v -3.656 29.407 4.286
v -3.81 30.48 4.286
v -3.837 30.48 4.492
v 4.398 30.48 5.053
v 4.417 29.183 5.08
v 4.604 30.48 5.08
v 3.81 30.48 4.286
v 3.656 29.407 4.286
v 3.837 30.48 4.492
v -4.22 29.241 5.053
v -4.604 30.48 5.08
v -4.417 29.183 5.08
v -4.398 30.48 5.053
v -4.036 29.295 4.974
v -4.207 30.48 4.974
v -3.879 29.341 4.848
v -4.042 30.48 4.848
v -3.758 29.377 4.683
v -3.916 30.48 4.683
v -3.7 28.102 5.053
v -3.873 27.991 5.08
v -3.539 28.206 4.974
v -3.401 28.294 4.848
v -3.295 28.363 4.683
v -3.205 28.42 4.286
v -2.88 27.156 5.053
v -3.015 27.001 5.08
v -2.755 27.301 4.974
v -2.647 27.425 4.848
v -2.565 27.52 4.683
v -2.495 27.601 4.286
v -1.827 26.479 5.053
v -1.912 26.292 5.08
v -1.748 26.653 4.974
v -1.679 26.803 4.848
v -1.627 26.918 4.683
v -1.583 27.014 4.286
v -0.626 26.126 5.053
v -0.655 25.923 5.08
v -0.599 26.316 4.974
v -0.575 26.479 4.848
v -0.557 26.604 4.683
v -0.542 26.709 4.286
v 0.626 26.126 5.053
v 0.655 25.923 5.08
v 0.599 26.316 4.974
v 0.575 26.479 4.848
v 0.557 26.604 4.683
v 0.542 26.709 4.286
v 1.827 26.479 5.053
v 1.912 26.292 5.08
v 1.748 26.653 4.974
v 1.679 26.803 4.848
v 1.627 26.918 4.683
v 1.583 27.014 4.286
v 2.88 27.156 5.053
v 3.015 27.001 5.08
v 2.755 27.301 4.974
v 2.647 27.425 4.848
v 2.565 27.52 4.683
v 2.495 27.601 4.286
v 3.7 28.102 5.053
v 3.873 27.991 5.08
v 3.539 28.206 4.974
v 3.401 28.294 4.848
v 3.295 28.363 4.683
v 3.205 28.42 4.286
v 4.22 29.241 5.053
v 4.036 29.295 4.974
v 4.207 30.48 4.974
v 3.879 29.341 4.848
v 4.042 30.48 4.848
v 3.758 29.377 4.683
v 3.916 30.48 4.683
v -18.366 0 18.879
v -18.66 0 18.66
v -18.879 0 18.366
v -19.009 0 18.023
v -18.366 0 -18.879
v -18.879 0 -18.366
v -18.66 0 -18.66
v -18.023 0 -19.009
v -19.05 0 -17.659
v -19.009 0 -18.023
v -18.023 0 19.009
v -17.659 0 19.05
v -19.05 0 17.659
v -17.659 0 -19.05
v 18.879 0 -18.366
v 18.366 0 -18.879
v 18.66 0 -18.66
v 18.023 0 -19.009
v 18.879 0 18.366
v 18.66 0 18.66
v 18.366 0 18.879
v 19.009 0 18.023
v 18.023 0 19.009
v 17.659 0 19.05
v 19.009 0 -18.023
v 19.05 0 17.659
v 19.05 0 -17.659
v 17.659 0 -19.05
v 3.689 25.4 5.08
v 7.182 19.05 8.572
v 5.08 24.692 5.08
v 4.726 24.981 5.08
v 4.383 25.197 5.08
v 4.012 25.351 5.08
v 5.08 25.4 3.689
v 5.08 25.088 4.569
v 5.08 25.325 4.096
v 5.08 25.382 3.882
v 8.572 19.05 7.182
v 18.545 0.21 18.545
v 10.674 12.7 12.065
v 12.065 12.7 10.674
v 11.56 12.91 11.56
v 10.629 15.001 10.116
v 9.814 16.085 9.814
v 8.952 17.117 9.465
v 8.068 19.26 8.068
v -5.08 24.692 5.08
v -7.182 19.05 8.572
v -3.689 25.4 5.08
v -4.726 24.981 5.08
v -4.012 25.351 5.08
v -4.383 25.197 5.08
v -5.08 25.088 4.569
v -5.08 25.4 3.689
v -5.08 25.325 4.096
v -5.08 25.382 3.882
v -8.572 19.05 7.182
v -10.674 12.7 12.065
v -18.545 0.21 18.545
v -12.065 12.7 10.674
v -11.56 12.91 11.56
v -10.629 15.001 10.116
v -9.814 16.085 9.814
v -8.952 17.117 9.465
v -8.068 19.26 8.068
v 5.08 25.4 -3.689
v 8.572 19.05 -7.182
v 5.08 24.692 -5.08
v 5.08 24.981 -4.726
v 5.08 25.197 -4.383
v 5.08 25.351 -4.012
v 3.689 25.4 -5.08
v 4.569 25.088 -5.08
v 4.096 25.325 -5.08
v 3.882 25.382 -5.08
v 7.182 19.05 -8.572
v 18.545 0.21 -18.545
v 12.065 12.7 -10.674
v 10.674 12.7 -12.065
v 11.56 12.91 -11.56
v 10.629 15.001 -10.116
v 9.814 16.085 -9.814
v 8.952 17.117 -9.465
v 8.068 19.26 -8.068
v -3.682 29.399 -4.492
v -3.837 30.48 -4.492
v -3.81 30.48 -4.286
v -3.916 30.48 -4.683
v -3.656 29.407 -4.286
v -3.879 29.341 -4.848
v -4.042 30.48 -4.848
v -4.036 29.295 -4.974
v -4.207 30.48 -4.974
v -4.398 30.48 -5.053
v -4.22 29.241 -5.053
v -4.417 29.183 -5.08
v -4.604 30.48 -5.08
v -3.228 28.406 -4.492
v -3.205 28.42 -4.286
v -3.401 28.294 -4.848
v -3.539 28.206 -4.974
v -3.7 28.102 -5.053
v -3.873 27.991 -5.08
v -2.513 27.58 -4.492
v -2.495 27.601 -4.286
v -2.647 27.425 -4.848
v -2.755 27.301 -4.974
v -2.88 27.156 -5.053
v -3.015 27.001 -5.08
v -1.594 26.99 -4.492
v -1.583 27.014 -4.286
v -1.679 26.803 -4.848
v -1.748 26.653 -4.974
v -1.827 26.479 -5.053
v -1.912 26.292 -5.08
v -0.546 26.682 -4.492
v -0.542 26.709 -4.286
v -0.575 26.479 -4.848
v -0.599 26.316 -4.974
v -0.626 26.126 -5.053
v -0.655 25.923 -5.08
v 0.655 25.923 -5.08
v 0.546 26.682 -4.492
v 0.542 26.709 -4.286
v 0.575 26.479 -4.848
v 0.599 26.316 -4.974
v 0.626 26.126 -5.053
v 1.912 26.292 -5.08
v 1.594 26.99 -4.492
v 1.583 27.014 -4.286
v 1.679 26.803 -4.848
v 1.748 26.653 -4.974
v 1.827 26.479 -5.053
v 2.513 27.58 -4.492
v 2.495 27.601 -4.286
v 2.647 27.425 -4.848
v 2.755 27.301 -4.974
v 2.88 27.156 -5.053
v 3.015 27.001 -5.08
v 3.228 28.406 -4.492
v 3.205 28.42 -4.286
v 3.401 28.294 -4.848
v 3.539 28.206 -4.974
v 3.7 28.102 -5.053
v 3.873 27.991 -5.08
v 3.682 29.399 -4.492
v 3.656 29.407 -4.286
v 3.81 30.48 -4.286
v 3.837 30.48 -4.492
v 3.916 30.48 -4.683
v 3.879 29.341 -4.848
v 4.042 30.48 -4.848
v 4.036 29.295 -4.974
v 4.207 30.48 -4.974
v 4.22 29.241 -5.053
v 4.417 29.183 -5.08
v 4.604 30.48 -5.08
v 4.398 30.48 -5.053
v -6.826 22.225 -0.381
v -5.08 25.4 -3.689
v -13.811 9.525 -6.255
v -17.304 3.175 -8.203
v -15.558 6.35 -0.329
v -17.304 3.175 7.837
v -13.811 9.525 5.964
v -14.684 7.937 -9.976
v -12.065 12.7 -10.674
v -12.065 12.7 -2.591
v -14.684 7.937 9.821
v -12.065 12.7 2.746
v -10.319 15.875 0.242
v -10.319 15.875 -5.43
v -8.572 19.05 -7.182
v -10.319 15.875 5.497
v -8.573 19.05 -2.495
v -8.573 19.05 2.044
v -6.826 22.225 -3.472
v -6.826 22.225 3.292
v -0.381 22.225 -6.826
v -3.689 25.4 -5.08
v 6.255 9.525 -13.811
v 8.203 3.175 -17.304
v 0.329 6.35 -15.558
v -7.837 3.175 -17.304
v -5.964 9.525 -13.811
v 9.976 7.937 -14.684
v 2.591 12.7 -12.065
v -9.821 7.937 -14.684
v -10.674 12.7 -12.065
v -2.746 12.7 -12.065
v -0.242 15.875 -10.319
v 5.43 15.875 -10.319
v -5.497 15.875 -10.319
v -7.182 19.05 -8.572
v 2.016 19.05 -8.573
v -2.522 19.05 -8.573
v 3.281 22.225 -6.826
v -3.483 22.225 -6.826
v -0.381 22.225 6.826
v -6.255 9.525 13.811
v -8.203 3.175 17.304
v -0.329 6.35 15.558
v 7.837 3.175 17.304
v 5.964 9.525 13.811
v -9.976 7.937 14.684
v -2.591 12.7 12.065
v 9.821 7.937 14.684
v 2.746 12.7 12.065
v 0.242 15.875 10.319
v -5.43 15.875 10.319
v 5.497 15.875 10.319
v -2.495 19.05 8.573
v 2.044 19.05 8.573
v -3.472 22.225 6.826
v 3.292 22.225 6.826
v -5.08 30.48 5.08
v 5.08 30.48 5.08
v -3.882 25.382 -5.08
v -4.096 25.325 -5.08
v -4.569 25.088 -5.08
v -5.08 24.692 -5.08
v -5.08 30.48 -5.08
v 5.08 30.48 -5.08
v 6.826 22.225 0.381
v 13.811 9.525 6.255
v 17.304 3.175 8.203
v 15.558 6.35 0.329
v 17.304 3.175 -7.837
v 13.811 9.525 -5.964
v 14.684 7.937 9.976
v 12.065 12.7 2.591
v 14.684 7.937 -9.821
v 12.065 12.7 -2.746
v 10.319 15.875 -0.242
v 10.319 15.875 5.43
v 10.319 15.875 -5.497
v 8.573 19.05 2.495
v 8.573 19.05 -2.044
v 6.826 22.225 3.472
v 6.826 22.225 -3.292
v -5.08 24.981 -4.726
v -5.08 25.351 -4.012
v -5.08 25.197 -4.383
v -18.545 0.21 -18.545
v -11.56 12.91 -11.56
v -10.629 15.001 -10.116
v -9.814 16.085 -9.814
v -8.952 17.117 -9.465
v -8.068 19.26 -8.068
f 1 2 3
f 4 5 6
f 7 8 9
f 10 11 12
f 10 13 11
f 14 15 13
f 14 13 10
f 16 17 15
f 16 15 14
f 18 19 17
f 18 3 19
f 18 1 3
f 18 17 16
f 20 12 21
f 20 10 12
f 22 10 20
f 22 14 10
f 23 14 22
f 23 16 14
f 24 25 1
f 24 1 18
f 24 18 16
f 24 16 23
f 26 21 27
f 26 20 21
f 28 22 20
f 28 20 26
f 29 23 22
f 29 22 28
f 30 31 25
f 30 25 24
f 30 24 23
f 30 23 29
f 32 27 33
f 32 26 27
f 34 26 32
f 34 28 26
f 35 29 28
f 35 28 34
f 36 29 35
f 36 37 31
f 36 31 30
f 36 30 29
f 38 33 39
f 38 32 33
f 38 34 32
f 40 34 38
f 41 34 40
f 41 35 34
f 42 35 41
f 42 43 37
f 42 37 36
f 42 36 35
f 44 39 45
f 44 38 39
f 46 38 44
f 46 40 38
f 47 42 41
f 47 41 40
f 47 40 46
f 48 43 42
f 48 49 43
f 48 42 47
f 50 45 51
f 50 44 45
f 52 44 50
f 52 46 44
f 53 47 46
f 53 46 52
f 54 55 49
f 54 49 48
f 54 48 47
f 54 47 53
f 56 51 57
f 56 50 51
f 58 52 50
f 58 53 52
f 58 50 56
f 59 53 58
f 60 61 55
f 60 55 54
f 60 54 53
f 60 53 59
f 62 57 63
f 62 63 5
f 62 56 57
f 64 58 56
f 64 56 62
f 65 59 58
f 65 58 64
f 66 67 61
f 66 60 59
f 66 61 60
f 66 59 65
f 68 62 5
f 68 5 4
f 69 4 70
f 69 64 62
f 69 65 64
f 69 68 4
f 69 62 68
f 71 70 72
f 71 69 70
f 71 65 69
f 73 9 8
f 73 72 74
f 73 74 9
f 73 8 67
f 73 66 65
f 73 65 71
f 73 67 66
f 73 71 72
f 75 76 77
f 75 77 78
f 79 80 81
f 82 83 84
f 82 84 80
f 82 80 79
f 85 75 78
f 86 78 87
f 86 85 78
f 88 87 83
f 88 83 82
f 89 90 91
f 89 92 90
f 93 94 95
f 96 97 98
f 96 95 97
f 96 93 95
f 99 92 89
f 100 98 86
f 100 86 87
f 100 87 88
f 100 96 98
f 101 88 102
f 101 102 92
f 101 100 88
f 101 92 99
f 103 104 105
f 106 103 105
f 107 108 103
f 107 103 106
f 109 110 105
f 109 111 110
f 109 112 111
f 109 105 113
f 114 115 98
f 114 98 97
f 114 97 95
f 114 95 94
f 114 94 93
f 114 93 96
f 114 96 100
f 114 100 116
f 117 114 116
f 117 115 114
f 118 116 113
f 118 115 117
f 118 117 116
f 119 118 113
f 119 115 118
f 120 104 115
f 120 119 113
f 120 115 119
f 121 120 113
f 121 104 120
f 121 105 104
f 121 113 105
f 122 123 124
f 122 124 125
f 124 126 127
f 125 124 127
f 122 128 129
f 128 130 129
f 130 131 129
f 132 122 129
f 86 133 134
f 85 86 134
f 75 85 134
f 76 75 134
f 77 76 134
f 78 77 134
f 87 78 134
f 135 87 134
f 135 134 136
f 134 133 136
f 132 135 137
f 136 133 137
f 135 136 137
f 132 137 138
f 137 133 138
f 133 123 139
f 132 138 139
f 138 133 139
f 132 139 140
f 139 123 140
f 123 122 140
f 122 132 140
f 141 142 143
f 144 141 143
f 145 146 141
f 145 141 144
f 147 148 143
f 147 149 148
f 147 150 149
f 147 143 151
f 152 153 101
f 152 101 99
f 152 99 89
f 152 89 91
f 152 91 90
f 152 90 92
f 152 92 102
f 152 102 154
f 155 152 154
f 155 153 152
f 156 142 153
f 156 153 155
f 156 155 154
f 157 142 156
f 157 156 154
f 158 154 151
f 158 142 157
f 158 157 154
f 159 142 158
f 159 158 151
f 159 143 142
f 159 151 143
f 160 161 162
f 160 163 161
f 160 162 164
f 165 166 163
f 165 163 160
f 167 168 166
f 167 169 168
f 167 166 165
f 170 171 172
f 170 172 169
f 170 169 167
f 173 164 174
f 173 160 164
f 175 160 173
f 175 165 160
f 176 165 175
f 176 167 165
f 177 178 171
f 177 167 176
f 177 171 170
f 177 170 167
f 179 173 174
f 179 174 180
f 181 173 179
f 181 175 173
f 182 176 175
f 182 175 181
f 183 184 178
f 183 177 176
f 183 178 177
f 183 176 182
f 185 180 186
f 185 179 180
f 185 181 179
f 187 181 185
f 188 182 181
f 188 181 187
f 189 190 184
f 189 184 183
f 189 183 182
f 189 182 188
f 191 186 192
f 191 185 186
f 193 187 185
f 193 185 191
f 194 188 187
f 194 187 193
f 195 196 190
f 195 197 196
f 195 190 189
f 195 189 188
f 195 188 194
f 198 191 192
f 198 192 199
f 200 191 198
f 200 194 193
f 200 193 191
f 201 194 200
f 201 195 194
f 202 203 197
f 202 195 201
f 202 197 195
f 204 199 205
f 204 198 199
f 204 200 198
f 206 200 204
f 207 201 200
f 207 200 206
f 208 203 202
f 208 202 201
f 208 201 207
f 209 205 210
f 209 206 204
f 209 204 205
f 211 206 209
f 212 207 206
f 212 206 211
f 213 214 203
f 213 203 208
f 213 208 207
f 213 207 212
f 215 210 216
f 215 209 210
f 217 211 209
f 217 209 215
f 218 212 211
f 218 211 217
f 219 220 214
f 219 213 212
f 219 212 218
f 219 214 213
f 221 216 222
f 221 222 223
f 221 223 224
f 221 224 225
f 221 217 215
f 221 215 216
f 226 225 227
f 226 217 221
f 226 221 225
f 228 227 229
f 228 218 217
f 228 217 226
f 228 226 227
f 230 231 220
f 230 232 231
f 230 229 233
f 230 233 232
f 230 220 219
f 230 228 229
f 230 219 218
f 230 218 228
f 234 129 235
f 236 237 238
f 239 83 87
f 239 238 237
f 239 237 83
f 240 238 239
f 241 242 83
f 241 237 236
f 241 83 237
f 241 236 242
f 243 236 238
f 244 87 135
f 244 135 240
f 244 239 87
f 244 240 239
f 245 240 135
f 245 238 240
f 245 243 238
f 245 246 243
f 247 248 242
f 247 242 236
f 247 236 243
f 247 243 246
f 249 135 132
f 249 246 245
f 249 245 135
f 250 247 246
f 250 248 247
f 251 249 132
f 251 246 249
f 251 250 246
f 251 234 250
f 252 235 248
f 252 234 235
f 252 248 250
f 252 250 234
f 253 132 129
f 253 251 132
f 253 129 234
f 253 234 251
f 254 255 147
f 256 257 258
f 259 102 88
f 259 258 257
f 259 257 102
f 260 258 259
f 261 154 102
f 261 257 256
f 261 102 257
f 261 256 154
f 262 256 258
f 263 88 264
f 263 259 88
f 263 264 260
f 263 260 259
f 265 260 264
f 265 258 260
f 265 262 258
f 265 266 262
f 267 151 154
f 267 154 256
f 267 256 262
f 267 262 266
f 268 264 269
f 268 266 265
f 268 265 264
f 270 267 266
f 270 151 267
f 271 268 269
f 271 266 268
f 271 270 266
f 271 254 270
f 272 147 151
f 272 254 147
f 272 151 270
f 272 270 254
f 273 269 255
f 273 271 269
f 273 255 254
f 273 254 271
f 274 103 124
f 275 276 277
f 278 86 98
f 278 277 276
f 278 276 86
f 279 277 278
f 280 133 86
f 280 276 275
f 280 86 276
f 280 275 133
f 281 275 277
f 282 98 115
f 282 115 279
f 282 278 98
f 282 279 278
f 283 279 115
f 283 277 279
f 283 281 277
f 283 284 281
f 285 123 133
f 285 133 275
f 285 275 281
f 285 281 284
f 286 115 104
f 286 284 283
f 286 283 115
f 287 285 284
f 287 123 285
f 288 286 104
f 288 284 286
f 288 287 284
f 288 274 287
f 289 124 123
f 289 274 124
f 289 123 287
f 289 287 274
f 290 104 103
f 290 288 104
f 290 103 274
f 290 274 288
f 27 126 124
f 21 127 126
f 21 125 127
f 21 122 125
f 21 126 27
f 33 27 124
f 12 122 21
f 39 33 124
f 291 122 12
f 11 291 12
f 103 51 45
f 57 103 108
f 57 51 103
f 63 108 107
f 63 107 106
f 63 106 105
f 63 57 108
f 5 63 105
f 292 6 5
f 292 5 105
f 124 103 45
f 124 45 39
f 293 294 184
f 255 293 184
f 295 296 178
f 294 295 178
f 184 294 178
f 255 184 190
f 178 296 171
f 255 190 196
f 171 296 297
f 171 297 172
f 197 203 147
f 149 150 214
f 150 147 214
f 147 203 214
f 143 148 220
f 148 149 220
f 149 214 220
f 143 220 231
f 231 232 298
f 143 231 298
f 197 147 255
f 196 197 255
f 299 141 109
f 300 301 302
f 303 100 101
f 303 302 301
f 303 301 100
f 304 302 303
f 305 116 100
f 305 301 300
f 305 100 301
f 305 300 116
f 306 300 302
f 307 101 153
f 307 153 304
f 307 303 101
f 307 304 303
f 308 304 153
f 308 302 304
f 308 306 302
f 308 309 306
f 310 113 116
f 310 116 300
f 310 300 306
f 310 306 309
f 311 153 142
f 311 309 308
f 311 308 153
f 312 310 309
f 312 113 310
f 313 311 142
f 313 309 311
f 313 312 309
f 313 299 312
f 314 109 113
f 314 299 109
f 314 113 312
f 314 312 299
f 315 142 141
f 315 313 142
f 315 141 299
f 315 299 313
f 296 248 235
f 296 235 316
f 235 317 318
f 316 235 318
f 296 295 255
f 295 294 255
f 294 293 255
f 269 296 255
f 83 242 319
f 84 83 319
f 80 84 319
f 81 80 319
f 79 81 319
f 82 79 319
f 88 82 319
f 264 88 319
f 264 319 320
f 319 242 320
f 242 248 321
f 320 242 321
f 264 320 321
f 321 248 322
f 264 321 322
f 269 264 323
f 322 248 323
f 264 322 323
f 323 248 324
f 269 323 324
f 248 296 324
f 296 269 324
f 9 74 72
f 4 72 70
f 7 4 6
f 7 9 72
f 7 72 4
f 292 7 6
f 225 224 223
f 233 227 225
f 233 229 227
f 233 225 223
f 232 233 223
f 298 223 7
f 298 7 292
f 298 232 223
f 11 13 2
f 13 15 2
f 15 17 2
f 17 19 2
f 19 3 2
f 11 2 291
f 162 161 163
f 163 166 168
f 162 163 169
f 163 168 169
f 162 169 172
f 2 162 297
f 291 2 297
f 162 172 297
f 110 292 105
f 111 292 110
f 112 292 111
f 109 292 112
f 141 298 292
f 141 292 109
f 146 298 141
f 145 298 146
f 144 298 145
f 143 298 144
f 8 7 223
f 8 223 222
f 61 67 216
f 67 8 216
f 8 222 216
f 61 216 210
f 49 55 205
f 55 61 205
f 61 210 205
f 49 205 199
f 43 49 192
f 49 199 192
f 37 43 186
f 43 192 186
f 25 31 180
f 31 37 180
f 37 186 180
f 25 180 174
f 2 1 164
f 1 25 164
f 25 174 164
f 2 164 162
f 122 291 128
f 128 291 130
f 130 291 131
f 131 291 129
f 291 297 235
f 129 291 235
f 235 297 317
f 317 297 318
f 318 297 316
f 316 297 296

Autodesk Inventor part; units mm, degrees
ref_plane "YZ Plane" through (0, 0, 0) normal (1, 0, 0) x (0, 1, 0)
sketch "Sketch1" plane through (0, 0, 0) normal (0, 1, 0) x (-1, 0, 0)
  line L0 (-19.05, 19.05) -> (-19.05, -19.05)
  line L1 (-19.05, -19.05) -> (19.05, -19.05)
  line L2 (19.05, -19.05) -> (19.05, 19.05)
  line L3 (19.05, 19.05) -> (-19.05, 19.05)
  line L4 (-19.05, 19.05) -> (19.05, -19.05) construction
  line L5 (-19.05, -19.05) -> (19.05, 19.05) construction
  point P0 (0, 0)
  dimension "base" = 38.1
ref_plane "Work Plane1" through (0, 25.4, 0) normal (0, 1, 0) x (-1, 0, 0)
sketch "Sketch2" plane through (0, 25.4, 0) normal (0, 1, 0) x (-1, 0, 0)
  line L0 (-5.08, 5.08) -> (-5.08, -5.08)
  line L1 (-5.08, -5.08) -> (5.08, -5.08)
  line L2 (5.08, -5.08) -> (5.08, 5.08)
  line L3 (5.08, 5.08) -> (-5.08, 5.08)
  line L4 (-5.08, 5.08) -> (5.08, -5.08) construction
  line L5 (-5.08, -5.08) -> (5.08, 5.08) construction
  point P0 (0, 0)
  dimension "topOfPyramid" = 10.16
loft "Loft1" add profiles "Sketch1", "Sketch2"
sketch "Sketch3" plane through (0, 0, 0) normal (0, 0, 1) x (1, 0, 0)
  arc A0 (-3.81, 30.48) -> (3.81, 30.48) centre (0, 30.48) ccw
  arc A1 (-5.08, 30.48) -> (5.08, 30.48) centre (0, 30.48) ccw
  line L0 (5.08, 25.4) -> (-5.08, 25.4) projected
  line L1 (3.81, 30.48) -> (5.08, 30.48)
  line L2 (-3.81, 30.48) -> (-5.08, 30.48)
  line L3 (-5.08, 30.48) -> (-5.08, 25.4)
  line L4 (5.08, 30.48) -> (5.08, 25.4)
  line L5 (19.05, 0) -> (5.08, 25.4) projected
  line L6 (5.08, 25.4) -> (0, 25.4)
  line L7 (-5.08, 25.4) -> (5.08, 25.4) projected
  line L8 (-5.08, 25.4) -> (0, 25.4)
  point P0 (0, 0)
  dimension "innerDiamForRope" = 7.62
  dimension "centerForRope" = 5.08
  dimension "outsideDiam" = 10.16
extrude "Extrusion1" add sketch "Sketch3" along normal mid plane 10.16
fillet "Fillet3" radius 1.5875 4 edges at (12.065, 12.7, 12.065) (12.065, 12.7, -12.065) (-12.065, 12.7, 12.065) (-12.065, 12.7, -12.065)
fillet "Fillet5" radius 0.7937 2 edges at (0, 26.67, 5.08) (0, 26.67, -5.08)
ref_plane "Work Plane2" through (0, 0, 19.05) normal (0, 0, 1) x (1, 0, 0)
equation "\"centerForRope\" = 0.5 * outsideDiam"
equation "\"widthOfTop\" = topOfPyramid"
equation "\"d17\" = 0.5 * base"
properties part number "OutdoorSupportForMouseWire"
